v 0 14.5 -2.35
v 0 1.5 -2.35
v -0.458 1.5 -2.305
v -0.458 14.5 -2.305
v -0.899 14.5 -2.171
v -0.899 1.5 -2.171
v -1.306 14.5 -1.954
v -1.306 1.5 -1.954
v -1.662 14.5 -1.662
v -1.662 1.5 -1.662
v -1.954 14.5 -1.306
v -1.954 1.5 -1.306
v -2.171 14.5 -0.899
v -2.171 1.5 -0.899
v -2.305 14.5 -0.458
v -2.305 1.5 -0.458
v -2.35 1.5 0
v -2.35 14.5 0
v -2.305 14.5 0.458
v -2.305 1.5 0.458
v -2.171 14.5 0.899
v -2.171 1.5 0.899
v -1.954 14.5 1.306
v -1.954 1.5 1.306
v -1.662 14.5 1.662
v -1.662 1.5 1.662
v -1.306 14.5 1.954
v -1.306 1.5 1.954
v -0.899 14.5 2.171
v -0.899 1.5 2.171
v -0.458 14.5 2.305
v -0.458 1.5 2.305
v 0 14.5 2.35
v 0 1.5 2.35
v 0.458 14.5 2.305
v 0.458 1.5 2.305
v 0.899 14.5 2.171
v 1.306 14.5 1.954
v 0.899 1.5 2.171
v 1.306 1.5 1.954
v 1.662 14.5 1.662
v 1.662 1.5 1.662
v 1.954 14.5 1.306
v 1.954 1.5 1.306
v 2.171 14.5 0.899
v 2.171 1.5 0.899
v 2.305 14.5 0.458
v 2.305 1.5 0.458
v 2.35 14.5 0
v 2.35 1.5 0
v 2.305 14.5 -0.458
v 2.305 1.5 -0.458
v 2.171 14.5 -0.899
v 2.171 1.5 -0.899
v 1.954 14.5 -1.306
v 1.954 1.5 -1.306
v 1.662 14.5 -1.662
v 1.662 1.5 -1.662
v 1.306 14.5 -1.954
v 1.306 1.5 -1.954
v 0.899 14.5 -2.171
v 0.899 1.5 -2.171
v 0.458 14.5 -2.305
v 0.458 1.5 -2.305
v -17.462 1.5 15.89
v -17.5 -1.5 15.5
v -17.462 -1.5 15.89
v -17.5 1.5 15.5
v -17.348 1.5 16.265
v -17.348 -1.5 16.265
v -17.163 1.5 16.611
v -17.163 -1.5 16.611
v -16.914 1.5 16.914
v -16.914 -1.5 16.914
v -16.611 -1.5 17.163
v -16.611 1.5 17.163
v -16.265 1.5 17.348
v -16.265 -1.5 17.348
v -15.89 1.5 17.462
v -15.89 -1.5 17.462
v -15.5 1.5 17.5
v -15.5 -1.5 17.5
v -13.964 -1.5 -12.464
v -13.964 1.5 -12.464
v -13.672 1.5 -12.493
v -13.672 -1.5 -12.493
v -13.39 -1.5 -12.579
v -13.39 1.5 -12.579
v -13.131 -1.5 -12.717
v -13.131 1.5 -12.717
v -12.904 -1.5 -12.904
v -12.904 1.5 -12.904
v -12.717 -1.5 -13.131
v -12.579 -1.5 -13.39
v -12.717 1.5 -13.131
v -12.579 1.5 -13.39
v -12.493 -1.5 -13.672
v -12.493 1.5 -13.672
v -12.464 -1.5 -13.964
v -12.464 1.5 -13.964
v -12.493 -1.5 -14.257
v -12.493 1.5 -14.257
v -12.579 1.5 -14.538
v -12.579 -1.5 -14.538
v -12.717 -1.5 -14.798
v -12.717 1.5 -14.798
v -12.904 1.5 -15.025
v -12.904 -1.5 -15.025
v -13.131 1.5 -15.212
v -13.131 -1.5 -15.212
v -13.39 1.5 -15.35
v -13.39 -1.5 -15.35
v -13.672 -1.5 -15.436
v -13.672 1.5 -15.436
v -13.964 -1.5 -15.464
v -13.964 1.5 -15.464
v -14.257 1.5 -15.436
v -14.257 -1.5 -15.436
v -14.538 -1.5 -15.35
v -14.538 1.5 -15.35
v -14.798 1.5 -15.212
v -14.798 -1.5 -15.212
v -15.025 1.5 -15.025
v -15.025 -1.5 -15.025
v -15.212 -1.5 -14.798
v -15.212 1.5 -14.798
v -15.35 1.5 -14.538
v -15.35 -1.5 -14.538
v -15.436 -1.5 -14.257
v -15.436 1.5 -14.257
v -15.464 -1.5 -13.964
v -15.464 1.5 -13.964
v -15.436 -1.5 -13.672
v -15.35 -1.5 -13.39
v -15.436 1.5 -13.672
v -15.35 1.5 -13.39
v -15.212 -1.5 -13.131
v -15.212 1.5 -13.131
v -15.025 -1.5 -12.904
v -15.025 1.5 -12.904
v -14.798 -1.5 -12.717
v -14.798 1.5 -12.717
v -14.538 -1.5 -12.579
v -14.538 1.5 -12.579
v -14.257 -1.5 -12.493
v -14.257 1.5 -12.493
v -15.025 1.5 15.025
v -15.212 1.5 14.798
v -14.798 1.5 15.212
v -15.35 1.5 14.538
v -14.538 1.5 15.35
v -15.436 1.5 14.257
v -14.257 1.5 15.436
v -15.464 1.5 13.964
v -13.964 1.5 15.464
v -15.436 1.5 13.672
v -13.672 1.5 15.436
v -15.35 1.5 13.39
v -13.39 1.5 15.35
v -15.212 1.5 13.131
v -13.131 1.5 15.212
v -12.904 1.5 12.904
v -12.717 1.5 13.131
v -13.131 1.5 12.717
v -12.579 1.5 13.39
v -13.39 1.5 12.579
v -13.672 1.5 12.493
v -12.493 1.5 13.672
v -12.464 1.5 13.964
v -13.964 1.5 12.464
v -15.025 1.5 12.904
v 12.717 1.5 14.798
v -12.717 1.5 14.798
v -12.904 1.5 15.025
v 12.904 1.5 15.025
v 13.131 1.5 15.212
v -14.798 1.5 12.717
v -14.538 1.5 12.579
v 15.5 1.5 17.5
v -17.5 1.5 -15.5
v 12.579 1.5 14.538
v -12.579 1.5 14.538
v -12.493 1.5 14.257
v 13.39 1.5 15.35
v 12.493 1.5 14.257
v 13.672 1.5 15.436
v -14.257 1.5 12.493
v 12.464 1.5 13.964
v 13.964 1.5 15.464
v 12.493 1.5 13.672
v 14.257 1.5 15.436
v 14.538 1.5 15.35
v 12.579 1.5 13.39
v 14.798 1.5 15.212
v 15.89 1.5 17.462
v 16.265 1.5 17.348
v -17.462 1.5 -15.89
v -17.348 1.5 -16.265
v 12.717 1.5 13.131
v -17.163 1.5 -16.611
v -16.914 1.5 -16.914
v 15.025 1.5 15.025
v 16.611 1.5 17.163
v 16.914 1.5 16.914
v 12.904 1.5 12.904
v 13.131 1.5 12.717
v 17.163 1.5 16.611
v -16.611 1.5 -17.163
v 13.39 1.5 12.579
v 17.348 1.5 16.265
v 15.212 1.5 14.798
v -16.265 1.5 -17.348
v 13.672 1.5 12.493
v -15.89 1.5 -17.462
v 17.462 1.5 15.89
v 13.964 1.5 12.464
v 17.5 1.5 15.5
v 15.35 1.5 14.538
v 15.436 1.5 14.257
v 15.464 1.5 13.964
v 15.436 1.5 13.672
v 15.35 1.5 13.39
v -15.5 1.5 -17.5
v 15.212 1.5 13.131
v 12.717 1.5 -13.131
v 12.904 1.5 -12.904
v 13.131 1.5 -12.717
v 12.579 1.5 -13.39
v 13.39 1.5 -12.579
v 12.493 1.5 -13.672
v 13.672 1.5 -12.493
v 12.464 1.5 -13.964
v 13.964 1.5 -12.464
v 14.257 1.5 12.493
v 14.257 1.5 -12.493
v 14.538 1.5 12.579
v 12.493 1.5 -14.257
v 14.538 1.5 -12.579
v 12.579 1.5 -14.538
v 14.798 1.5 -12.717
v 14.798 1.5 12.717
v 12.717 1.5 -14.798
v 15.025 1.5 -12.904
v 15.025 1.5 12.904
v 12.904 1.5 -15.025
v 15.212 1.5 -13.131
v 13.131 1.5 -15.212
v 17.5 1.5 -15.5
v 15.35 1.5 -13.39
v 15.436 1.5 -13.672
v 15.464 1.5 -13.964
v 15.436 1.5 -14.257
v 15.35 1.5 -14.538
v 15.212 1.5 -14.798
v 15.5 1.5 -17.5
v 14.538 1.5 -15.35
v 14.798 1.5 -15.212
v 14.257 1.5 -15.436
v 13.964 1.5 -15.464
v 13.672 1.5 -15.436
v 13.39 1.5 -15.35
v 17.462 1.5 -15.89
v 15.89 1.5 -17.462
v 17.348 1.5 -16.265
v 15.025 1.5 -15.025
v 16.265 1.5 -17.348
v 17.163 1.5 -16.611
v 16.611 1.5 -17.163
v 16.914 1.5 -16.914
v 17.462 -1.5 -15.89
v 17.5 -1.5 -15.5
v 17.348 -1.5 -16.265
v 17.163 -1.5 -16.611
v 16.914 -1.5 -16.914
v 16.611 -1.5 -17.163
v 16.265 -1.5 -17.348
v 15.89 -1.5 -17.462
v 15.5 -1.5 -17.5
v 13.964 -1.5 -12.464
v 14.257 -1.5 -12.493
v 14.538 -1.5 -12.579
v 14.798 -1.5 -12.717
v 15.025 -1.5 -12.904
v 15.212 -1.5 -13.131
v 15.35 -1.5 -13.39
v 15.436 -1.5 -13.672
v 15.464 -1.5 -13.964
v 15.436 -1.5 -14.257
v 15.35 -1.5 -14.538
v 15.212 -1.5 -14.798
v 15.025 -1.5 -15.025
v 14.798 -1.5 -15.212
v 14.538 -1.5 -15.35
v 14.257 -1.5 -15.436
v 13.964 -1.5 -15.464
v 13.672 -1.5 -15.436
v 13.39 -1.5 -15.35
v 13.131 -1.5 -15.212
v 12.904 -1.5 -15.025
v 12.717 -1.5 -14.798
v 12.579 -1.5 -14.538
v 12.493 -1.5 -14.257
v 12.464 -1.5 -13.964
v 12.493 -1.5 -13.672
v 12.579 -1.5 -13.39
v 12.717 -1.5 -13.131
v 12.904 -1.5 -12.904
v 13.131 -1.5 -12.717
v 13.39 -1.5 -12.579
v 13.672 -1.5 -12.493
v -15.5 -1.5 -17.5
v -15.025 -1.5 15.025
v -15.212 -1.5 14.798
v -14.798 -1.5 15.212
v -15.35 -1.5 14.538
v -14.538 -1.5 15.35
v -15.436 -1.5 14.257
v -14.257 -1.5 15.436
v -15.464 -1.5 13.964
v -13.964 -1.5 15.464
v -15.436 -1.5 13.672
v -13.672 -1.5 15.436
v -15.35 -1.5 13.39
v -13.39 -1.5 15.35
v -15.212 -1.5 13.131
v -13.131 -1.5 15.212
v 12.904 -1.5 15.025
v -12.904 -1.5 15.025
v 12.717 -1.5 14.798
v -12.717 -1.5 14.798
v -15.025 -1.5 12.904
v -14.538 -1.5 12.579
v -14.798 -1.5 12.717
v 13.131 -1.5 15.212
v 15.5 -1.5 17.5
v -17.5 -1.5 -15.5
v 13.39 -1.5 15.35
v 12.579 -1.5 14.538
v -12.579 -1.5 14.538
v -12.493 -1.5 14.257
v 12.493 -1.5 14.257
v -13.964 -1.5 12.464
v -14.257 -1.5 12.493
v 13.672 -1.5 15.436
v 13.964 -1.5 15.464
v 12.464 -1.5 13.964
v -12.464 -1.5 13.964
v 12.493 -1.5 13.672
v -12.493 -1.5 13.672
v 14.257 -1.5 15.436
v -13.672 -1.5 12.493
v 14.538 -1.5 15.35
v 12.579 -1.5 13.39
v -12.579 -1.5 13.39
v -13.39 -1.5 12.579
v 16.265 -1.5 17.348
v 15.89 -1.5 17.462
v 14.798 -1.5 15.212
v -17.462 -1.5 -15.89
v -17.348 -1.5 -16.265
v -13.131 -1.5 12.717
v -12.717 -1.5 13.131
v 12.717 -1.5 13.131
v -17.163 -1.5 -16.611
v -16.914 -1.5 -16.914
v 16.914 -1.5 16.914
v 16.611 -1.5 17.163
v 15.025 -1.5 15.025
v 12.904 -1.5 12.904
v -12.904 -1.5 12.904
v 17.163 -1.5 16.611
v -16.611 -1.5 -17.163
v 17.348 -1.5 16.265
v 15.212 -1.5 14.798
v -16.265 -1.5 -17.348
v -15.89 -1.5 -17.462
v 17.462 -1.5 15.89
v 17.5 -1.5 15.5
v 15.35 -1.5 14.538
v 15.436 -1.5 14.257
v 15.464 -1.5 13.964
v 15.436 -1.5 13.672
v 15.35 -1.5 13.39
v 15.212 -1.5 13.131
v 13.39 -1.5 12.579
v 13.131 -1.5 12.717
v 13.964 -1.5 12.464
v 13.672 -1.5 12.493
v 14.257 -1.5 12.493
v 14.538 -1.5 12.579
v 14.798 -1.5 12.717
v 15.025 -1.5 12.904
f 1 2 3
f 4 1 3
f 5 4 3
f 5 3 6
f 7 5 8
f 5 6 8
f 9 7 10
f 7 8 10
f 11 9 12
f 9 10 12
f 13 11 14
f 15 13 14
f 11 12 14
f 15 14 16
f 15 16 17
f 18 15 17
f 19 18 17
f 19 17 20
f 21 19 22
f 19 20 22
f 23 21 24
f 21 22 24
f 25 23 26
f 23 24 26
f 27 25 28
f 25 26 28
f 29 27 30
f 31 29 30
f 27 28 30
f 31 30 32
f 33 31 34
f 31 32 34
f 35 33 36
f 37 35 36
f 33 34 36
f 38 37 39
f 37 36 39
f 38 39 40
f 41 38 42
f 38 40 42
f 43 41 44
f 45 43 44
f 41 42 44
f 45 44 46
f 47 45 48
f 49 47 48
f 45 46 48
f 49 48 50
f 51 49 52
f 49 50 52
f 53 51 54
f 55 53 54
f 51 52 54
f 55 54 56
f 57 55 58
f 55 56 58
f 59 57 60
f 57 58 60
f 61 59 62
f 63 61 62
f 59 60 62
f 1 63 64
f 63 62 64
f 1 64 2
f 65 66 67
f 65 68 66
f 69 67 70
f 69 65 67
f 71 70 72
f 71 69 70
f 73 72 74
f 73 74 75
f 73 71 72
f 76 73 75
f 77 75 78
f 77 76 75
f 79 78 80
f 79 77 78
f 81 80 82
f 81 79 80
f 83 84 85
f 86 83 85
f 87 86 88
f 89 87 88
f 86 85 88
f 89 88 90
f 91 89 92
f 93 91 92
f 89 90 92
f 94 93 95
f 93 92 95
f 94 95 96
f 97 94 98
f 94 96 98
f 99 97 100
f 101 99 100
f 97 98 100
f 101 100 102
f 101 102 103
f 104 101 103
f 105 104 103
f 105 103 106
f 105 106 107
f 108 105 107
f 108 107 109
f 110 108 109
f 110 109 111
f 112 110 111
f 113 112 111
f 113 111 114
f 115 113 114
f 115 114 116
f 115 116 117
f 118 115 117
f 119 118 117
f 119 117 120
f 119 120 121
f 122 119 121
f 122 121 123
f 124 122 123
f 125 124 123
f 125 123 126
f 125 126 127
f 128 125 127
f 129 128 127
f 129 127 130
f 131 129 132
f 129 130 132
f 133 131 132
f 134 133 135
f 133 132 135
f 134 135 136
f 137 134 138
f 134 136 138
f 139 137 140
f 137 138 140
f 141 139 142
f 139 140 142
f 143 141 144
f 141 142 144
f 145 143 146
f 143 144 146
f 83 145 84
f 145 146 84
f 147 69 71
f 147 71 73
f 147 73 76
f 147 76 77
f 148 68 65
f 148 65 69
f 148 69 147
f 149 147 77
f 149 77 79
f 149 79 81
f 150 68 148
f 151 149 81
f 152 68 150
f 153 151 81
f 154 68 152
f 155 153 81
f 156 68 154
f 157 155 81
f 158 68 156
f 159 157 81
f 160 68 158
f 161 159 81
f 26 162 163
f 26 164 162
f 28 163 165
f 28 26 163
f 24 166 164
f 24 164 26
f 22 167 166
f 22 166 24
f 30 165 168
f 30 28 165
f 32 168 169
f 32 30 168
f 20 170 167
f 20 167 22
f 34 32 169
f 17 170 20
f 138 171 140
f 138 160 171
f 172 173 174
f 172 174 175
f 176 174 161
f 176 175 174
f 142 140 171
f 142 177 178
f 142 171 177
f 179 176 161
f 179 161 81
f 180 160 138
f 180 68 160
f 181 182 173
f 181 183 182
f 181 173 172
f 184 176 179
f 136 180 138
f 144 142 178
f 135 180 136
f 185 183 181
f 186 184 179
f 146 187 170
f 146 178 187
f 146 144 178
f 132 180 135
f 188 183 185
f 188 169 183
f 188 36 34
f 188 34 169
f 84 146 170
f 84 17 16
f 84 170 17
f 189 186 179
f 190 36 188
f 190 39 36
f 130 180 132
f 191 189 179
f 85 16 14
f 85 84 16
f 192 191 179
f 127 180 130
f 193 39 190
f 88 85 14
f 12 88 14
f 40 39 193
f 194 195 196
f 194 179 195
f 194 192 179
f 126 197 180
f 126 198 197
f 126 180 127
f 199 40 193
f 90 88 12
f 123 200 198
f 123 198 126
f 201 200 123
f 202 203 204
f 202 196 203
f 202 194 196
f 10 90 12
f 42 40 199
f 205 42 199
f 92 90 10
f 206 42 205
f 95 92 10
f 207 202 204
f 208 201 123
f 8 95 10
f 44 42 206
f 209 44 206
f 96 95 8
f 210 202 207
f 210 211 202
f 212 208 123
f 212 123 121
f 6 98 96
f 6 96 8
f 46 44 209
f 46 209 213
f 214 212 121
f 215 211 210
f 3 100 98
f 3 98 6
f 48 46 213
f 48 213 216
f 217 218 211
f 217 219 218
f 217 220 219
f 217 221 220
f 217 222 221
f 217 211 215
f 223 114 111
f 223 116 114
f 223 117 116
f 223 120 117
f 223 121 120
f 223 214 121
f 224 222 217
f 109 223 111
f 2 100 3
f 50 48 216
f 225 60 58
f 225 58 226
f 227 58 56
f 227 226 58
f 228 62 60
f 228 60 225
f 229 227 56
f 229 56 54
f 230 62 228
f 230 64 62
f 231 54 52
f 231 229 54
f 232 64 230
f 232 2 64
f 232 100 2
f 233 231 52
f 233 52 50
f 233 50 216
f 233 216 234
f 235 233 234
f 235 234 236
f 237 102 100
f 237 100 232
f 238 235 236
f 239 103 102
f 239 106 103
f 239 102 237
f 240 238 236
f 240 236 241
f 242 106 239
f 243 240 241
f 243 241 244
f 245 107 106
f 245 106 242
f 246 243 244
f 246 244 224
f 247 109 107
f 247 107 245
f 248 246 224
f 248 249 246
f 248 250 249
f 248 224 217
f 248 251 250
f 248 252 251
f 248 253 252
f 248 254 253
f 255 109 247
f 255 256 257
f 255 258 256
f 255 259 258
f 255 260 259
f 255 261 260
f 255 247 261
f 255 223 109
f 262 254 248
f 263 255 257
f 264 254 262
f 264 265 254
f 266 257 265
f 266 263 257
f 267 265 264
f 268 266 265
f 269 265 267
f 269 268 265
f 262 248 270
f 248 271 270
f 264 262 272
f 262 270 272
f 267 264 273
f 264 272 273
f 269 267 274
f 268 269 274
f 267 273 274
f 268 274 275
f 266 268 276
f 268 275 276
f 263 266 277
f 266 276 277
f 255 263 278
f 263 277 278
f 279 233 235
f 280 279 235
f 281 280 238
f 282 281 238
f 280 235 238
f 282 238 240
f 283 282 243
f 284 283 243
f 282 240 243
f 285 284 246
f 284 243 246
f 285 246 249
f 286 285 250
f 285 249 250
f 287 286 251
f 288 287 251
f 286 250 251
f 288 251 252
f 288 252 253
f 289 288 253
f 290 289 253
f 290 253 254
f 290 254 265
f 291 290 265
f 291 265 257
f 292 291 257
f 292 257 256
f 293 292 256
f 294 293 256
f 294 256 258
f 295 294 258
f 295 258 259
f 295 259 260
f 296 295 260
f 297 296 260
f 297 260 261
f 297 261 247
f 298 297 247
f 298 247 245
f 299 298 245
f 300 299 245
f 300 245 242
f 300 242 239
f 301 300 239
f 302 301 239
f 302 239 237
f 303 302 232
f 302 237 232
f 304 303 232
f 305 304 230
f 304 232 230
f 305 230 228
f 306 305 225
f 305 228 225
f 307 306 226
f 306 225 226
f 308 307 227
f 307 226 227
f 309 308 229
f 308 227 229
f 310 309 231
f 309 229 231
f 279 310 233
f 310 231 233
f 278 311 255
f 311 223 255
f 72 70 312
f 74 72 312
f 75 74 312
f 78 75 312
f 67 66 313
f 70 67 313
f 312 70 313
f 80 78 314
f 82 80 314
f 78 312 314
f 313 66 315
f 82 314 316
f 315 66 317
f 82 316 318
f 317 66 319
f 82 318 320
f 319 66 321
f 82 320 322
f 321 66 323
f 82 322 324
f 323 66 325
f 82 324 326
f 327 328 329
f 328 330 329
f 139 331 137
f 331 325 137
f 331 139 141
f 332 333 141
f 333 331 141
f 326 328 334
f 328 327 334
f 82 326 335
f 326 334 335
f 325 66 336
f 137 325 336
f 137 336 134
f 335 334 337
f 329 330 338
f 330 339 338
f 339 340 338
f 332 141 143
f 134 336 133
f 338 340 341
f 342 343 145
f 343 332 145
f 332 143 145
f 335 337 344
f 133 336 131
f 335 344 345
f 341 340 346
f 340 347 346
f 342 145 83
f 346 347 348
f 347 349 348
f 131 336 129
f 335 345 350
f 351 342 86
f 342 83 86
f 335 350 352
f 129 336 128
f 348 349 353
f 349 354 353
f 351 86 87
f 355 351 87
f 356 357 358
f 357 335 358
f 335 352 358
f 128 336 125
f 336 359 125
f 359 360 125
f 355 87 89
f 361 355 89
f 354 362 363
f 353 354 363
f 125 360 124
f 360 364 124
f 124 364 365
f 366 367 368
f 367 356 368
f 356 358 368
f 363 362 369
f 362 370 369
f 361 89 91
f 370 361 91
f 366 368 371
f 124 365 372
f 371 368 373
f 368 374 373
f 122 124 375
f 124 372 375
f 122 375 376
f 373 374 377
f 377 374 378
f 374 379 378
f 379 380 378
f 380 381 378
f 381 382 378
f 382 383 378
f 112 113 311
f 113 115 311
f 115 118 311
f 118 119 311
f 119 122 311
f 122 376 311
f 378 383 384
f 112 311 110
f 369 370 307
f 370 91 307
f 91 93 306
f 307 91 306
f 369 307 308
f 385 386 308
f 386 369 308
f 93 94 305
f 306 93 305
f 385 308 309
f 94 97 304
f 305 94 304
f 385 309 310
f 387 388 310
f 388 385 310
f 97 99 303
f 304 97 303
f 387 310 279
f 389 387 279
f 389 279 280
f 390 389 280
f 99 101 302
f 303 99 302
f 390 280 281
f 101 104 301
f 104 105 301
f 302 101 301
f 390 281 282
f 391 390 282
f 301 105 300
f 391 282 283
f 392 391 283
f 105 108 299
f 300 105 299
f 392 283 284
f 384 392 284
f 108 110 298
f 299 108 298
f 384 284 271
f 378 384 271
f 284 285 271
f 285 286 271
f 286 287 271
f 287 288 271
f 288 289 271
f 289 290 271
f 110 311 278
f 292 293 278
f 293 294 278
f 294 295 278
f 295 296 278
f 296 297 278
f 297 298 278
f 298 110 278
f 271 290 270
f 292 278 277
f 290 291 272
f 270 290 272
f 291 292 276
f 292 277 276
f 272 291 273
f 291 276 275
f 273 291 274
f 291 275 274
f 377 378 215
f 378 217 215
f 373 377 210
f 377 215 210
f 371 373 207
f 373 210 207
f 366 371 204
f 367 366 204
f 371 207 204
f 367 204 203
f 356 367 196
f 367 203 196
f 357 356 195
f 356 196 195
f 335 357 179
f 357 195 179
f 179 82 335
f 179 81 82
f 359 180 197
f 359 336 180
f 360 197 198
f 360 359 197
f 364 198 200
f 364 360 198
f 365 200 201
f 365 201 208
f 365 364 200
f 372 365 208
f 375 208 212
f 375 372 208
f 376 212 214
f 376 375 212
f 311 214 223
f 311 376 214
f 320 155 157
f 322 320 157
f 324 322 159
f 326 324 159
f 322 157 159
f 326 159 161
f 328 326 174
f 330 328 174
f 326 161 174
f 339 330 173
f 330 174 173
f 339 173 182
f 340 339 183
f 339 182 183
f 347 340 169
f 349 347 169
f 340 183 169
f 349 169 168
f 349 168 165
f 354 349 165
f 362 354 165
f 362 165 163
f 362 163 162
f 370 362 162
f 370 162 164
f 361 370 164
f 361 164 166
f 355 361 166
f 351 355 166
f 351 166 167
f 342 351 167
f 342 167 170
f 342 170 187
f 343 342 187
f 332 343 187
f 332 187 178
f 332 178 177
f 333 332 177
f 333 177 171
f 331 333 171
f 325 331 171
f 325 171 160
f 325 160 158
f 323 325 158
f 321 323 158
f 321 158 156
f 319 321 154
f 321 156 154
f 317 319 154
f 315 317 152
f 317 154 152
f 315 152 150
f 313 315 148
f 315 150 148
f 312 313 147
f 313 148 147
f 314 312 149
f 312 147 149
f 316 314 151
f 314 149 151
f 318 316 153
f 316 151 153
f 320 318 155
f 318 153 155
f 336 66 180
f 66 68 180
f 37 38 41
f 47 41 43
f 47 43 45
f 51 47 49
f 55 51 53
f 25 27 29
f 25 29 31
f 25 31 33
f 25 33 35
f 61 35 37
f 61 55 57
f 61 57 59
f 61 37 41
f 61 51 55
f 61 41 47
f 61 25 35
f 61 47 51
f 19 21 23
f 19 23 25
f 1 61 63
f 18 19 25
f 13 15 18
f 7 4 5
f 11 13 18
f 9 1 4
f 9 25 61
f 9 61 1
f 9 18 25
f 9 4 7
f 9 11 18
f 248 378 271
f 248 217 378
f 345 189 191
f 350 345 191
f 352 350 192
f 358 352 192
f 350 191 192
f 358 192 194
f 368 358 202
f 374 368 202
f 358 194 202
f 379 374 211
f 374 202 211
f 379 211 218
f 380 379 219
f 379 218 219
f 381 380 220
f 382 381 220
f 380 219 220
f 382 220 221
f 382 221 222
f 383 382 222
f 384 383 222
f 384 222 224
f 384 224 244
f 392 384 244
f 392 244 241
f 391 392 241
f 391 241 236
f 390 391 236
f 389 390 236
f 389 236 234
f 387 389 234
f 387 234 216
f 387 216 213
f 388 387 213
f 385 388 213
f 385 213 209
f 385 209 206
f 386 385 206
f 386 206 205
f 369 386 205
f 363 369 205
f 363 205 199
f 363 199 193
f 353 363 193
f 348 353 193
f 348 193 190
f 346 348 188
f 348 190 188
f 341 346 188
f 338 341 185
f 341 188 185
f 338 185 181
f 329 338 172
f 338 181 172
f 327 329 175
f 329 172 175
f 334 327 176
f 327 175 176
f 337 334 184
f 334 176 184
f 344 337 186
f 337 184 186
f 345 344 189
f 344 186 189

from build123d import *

# Parameters (mm, degrees)
ESBO_O1_W                = 35
ESBO_O1_H                = 35
RESSALTO_EXTRUS_O1_DEPTH = 1.5
FILETE1_R                = 2
ESBO_O2_R                = 2.35
RESSALTO_EXTRUS_O2_DEPTH = 13
ESBO_O3_R                = 1.5
CORTE_EXTRUS_O1_DEPTH    = 10


with BuildPart() as part:
    # Esboço1 → Ressalto-extrusão1 (new, symmetric)
    with BuildSketch(Plane(origin=(0, 0, 0), x_dir=(1, 0, 0), z_dir=(0, 1, 0))):
        Rectangle(ESBO_O1_W, ESBO_O1_H)
    extrude(amount=RESSALTO_EXTRUS_O1_DEPTH, both=True)

    # Filete1
    filete1_edges = [part.edges().sort_by_distance(p)[0] for p in [
        (17.5, 0, 17.5),
        (-17.5, 0, 17.5),
        (-17.5, 0, -17.5),
        (17.5, 0, -17.5),
    ]]
    fillet(filete1_edges, radius=FILETE1_R)

    # Esboço2 → Ressalto-extrusão2 (add)
    with BuildSketch(Plane(origin=(0, 1.5, 0), x_dir=(1, 0, 0), z_dir=(0, 1, 0))):
        with Locations(Location((0, 0, 0), (0, 0, 90))):
            Circle(ESBO_O2_R)
    extrude(amount=RESSALTO_EXTRUS_O2_DEPTH)

    # Esboço3 → Corte-extrusão1 (cut)
    with BuildSketch(Plane(origin=(0, 1.5, 0), x_dir=(1, 0, 0), z_dir=(0, 1, 0))):
        with Locations(Location((13.964466094, 13.964466094, 0), (0, 0, 270))):
            Circle(ESBO_O3_R)
        with Locations(Location((13.964466094, -13.964466094, 0), (0, 0, 270))):
            Circle(ESBO_O3_R)
        with Locations(Location((-13.964466094, -13.964466094, 0), (0, 0, 270))):
            Circle(ESBO_O3_R)
        with Locations(Location((-13.964466094, 13.964466094, 0), (0, 0, 270))):
            Circle(ESBO_O3_R)
    extrude(amount=-CORTE_EXTRUS_O1_DEPTH, mode=Mode.SUBTRACT)


solid = part.part
